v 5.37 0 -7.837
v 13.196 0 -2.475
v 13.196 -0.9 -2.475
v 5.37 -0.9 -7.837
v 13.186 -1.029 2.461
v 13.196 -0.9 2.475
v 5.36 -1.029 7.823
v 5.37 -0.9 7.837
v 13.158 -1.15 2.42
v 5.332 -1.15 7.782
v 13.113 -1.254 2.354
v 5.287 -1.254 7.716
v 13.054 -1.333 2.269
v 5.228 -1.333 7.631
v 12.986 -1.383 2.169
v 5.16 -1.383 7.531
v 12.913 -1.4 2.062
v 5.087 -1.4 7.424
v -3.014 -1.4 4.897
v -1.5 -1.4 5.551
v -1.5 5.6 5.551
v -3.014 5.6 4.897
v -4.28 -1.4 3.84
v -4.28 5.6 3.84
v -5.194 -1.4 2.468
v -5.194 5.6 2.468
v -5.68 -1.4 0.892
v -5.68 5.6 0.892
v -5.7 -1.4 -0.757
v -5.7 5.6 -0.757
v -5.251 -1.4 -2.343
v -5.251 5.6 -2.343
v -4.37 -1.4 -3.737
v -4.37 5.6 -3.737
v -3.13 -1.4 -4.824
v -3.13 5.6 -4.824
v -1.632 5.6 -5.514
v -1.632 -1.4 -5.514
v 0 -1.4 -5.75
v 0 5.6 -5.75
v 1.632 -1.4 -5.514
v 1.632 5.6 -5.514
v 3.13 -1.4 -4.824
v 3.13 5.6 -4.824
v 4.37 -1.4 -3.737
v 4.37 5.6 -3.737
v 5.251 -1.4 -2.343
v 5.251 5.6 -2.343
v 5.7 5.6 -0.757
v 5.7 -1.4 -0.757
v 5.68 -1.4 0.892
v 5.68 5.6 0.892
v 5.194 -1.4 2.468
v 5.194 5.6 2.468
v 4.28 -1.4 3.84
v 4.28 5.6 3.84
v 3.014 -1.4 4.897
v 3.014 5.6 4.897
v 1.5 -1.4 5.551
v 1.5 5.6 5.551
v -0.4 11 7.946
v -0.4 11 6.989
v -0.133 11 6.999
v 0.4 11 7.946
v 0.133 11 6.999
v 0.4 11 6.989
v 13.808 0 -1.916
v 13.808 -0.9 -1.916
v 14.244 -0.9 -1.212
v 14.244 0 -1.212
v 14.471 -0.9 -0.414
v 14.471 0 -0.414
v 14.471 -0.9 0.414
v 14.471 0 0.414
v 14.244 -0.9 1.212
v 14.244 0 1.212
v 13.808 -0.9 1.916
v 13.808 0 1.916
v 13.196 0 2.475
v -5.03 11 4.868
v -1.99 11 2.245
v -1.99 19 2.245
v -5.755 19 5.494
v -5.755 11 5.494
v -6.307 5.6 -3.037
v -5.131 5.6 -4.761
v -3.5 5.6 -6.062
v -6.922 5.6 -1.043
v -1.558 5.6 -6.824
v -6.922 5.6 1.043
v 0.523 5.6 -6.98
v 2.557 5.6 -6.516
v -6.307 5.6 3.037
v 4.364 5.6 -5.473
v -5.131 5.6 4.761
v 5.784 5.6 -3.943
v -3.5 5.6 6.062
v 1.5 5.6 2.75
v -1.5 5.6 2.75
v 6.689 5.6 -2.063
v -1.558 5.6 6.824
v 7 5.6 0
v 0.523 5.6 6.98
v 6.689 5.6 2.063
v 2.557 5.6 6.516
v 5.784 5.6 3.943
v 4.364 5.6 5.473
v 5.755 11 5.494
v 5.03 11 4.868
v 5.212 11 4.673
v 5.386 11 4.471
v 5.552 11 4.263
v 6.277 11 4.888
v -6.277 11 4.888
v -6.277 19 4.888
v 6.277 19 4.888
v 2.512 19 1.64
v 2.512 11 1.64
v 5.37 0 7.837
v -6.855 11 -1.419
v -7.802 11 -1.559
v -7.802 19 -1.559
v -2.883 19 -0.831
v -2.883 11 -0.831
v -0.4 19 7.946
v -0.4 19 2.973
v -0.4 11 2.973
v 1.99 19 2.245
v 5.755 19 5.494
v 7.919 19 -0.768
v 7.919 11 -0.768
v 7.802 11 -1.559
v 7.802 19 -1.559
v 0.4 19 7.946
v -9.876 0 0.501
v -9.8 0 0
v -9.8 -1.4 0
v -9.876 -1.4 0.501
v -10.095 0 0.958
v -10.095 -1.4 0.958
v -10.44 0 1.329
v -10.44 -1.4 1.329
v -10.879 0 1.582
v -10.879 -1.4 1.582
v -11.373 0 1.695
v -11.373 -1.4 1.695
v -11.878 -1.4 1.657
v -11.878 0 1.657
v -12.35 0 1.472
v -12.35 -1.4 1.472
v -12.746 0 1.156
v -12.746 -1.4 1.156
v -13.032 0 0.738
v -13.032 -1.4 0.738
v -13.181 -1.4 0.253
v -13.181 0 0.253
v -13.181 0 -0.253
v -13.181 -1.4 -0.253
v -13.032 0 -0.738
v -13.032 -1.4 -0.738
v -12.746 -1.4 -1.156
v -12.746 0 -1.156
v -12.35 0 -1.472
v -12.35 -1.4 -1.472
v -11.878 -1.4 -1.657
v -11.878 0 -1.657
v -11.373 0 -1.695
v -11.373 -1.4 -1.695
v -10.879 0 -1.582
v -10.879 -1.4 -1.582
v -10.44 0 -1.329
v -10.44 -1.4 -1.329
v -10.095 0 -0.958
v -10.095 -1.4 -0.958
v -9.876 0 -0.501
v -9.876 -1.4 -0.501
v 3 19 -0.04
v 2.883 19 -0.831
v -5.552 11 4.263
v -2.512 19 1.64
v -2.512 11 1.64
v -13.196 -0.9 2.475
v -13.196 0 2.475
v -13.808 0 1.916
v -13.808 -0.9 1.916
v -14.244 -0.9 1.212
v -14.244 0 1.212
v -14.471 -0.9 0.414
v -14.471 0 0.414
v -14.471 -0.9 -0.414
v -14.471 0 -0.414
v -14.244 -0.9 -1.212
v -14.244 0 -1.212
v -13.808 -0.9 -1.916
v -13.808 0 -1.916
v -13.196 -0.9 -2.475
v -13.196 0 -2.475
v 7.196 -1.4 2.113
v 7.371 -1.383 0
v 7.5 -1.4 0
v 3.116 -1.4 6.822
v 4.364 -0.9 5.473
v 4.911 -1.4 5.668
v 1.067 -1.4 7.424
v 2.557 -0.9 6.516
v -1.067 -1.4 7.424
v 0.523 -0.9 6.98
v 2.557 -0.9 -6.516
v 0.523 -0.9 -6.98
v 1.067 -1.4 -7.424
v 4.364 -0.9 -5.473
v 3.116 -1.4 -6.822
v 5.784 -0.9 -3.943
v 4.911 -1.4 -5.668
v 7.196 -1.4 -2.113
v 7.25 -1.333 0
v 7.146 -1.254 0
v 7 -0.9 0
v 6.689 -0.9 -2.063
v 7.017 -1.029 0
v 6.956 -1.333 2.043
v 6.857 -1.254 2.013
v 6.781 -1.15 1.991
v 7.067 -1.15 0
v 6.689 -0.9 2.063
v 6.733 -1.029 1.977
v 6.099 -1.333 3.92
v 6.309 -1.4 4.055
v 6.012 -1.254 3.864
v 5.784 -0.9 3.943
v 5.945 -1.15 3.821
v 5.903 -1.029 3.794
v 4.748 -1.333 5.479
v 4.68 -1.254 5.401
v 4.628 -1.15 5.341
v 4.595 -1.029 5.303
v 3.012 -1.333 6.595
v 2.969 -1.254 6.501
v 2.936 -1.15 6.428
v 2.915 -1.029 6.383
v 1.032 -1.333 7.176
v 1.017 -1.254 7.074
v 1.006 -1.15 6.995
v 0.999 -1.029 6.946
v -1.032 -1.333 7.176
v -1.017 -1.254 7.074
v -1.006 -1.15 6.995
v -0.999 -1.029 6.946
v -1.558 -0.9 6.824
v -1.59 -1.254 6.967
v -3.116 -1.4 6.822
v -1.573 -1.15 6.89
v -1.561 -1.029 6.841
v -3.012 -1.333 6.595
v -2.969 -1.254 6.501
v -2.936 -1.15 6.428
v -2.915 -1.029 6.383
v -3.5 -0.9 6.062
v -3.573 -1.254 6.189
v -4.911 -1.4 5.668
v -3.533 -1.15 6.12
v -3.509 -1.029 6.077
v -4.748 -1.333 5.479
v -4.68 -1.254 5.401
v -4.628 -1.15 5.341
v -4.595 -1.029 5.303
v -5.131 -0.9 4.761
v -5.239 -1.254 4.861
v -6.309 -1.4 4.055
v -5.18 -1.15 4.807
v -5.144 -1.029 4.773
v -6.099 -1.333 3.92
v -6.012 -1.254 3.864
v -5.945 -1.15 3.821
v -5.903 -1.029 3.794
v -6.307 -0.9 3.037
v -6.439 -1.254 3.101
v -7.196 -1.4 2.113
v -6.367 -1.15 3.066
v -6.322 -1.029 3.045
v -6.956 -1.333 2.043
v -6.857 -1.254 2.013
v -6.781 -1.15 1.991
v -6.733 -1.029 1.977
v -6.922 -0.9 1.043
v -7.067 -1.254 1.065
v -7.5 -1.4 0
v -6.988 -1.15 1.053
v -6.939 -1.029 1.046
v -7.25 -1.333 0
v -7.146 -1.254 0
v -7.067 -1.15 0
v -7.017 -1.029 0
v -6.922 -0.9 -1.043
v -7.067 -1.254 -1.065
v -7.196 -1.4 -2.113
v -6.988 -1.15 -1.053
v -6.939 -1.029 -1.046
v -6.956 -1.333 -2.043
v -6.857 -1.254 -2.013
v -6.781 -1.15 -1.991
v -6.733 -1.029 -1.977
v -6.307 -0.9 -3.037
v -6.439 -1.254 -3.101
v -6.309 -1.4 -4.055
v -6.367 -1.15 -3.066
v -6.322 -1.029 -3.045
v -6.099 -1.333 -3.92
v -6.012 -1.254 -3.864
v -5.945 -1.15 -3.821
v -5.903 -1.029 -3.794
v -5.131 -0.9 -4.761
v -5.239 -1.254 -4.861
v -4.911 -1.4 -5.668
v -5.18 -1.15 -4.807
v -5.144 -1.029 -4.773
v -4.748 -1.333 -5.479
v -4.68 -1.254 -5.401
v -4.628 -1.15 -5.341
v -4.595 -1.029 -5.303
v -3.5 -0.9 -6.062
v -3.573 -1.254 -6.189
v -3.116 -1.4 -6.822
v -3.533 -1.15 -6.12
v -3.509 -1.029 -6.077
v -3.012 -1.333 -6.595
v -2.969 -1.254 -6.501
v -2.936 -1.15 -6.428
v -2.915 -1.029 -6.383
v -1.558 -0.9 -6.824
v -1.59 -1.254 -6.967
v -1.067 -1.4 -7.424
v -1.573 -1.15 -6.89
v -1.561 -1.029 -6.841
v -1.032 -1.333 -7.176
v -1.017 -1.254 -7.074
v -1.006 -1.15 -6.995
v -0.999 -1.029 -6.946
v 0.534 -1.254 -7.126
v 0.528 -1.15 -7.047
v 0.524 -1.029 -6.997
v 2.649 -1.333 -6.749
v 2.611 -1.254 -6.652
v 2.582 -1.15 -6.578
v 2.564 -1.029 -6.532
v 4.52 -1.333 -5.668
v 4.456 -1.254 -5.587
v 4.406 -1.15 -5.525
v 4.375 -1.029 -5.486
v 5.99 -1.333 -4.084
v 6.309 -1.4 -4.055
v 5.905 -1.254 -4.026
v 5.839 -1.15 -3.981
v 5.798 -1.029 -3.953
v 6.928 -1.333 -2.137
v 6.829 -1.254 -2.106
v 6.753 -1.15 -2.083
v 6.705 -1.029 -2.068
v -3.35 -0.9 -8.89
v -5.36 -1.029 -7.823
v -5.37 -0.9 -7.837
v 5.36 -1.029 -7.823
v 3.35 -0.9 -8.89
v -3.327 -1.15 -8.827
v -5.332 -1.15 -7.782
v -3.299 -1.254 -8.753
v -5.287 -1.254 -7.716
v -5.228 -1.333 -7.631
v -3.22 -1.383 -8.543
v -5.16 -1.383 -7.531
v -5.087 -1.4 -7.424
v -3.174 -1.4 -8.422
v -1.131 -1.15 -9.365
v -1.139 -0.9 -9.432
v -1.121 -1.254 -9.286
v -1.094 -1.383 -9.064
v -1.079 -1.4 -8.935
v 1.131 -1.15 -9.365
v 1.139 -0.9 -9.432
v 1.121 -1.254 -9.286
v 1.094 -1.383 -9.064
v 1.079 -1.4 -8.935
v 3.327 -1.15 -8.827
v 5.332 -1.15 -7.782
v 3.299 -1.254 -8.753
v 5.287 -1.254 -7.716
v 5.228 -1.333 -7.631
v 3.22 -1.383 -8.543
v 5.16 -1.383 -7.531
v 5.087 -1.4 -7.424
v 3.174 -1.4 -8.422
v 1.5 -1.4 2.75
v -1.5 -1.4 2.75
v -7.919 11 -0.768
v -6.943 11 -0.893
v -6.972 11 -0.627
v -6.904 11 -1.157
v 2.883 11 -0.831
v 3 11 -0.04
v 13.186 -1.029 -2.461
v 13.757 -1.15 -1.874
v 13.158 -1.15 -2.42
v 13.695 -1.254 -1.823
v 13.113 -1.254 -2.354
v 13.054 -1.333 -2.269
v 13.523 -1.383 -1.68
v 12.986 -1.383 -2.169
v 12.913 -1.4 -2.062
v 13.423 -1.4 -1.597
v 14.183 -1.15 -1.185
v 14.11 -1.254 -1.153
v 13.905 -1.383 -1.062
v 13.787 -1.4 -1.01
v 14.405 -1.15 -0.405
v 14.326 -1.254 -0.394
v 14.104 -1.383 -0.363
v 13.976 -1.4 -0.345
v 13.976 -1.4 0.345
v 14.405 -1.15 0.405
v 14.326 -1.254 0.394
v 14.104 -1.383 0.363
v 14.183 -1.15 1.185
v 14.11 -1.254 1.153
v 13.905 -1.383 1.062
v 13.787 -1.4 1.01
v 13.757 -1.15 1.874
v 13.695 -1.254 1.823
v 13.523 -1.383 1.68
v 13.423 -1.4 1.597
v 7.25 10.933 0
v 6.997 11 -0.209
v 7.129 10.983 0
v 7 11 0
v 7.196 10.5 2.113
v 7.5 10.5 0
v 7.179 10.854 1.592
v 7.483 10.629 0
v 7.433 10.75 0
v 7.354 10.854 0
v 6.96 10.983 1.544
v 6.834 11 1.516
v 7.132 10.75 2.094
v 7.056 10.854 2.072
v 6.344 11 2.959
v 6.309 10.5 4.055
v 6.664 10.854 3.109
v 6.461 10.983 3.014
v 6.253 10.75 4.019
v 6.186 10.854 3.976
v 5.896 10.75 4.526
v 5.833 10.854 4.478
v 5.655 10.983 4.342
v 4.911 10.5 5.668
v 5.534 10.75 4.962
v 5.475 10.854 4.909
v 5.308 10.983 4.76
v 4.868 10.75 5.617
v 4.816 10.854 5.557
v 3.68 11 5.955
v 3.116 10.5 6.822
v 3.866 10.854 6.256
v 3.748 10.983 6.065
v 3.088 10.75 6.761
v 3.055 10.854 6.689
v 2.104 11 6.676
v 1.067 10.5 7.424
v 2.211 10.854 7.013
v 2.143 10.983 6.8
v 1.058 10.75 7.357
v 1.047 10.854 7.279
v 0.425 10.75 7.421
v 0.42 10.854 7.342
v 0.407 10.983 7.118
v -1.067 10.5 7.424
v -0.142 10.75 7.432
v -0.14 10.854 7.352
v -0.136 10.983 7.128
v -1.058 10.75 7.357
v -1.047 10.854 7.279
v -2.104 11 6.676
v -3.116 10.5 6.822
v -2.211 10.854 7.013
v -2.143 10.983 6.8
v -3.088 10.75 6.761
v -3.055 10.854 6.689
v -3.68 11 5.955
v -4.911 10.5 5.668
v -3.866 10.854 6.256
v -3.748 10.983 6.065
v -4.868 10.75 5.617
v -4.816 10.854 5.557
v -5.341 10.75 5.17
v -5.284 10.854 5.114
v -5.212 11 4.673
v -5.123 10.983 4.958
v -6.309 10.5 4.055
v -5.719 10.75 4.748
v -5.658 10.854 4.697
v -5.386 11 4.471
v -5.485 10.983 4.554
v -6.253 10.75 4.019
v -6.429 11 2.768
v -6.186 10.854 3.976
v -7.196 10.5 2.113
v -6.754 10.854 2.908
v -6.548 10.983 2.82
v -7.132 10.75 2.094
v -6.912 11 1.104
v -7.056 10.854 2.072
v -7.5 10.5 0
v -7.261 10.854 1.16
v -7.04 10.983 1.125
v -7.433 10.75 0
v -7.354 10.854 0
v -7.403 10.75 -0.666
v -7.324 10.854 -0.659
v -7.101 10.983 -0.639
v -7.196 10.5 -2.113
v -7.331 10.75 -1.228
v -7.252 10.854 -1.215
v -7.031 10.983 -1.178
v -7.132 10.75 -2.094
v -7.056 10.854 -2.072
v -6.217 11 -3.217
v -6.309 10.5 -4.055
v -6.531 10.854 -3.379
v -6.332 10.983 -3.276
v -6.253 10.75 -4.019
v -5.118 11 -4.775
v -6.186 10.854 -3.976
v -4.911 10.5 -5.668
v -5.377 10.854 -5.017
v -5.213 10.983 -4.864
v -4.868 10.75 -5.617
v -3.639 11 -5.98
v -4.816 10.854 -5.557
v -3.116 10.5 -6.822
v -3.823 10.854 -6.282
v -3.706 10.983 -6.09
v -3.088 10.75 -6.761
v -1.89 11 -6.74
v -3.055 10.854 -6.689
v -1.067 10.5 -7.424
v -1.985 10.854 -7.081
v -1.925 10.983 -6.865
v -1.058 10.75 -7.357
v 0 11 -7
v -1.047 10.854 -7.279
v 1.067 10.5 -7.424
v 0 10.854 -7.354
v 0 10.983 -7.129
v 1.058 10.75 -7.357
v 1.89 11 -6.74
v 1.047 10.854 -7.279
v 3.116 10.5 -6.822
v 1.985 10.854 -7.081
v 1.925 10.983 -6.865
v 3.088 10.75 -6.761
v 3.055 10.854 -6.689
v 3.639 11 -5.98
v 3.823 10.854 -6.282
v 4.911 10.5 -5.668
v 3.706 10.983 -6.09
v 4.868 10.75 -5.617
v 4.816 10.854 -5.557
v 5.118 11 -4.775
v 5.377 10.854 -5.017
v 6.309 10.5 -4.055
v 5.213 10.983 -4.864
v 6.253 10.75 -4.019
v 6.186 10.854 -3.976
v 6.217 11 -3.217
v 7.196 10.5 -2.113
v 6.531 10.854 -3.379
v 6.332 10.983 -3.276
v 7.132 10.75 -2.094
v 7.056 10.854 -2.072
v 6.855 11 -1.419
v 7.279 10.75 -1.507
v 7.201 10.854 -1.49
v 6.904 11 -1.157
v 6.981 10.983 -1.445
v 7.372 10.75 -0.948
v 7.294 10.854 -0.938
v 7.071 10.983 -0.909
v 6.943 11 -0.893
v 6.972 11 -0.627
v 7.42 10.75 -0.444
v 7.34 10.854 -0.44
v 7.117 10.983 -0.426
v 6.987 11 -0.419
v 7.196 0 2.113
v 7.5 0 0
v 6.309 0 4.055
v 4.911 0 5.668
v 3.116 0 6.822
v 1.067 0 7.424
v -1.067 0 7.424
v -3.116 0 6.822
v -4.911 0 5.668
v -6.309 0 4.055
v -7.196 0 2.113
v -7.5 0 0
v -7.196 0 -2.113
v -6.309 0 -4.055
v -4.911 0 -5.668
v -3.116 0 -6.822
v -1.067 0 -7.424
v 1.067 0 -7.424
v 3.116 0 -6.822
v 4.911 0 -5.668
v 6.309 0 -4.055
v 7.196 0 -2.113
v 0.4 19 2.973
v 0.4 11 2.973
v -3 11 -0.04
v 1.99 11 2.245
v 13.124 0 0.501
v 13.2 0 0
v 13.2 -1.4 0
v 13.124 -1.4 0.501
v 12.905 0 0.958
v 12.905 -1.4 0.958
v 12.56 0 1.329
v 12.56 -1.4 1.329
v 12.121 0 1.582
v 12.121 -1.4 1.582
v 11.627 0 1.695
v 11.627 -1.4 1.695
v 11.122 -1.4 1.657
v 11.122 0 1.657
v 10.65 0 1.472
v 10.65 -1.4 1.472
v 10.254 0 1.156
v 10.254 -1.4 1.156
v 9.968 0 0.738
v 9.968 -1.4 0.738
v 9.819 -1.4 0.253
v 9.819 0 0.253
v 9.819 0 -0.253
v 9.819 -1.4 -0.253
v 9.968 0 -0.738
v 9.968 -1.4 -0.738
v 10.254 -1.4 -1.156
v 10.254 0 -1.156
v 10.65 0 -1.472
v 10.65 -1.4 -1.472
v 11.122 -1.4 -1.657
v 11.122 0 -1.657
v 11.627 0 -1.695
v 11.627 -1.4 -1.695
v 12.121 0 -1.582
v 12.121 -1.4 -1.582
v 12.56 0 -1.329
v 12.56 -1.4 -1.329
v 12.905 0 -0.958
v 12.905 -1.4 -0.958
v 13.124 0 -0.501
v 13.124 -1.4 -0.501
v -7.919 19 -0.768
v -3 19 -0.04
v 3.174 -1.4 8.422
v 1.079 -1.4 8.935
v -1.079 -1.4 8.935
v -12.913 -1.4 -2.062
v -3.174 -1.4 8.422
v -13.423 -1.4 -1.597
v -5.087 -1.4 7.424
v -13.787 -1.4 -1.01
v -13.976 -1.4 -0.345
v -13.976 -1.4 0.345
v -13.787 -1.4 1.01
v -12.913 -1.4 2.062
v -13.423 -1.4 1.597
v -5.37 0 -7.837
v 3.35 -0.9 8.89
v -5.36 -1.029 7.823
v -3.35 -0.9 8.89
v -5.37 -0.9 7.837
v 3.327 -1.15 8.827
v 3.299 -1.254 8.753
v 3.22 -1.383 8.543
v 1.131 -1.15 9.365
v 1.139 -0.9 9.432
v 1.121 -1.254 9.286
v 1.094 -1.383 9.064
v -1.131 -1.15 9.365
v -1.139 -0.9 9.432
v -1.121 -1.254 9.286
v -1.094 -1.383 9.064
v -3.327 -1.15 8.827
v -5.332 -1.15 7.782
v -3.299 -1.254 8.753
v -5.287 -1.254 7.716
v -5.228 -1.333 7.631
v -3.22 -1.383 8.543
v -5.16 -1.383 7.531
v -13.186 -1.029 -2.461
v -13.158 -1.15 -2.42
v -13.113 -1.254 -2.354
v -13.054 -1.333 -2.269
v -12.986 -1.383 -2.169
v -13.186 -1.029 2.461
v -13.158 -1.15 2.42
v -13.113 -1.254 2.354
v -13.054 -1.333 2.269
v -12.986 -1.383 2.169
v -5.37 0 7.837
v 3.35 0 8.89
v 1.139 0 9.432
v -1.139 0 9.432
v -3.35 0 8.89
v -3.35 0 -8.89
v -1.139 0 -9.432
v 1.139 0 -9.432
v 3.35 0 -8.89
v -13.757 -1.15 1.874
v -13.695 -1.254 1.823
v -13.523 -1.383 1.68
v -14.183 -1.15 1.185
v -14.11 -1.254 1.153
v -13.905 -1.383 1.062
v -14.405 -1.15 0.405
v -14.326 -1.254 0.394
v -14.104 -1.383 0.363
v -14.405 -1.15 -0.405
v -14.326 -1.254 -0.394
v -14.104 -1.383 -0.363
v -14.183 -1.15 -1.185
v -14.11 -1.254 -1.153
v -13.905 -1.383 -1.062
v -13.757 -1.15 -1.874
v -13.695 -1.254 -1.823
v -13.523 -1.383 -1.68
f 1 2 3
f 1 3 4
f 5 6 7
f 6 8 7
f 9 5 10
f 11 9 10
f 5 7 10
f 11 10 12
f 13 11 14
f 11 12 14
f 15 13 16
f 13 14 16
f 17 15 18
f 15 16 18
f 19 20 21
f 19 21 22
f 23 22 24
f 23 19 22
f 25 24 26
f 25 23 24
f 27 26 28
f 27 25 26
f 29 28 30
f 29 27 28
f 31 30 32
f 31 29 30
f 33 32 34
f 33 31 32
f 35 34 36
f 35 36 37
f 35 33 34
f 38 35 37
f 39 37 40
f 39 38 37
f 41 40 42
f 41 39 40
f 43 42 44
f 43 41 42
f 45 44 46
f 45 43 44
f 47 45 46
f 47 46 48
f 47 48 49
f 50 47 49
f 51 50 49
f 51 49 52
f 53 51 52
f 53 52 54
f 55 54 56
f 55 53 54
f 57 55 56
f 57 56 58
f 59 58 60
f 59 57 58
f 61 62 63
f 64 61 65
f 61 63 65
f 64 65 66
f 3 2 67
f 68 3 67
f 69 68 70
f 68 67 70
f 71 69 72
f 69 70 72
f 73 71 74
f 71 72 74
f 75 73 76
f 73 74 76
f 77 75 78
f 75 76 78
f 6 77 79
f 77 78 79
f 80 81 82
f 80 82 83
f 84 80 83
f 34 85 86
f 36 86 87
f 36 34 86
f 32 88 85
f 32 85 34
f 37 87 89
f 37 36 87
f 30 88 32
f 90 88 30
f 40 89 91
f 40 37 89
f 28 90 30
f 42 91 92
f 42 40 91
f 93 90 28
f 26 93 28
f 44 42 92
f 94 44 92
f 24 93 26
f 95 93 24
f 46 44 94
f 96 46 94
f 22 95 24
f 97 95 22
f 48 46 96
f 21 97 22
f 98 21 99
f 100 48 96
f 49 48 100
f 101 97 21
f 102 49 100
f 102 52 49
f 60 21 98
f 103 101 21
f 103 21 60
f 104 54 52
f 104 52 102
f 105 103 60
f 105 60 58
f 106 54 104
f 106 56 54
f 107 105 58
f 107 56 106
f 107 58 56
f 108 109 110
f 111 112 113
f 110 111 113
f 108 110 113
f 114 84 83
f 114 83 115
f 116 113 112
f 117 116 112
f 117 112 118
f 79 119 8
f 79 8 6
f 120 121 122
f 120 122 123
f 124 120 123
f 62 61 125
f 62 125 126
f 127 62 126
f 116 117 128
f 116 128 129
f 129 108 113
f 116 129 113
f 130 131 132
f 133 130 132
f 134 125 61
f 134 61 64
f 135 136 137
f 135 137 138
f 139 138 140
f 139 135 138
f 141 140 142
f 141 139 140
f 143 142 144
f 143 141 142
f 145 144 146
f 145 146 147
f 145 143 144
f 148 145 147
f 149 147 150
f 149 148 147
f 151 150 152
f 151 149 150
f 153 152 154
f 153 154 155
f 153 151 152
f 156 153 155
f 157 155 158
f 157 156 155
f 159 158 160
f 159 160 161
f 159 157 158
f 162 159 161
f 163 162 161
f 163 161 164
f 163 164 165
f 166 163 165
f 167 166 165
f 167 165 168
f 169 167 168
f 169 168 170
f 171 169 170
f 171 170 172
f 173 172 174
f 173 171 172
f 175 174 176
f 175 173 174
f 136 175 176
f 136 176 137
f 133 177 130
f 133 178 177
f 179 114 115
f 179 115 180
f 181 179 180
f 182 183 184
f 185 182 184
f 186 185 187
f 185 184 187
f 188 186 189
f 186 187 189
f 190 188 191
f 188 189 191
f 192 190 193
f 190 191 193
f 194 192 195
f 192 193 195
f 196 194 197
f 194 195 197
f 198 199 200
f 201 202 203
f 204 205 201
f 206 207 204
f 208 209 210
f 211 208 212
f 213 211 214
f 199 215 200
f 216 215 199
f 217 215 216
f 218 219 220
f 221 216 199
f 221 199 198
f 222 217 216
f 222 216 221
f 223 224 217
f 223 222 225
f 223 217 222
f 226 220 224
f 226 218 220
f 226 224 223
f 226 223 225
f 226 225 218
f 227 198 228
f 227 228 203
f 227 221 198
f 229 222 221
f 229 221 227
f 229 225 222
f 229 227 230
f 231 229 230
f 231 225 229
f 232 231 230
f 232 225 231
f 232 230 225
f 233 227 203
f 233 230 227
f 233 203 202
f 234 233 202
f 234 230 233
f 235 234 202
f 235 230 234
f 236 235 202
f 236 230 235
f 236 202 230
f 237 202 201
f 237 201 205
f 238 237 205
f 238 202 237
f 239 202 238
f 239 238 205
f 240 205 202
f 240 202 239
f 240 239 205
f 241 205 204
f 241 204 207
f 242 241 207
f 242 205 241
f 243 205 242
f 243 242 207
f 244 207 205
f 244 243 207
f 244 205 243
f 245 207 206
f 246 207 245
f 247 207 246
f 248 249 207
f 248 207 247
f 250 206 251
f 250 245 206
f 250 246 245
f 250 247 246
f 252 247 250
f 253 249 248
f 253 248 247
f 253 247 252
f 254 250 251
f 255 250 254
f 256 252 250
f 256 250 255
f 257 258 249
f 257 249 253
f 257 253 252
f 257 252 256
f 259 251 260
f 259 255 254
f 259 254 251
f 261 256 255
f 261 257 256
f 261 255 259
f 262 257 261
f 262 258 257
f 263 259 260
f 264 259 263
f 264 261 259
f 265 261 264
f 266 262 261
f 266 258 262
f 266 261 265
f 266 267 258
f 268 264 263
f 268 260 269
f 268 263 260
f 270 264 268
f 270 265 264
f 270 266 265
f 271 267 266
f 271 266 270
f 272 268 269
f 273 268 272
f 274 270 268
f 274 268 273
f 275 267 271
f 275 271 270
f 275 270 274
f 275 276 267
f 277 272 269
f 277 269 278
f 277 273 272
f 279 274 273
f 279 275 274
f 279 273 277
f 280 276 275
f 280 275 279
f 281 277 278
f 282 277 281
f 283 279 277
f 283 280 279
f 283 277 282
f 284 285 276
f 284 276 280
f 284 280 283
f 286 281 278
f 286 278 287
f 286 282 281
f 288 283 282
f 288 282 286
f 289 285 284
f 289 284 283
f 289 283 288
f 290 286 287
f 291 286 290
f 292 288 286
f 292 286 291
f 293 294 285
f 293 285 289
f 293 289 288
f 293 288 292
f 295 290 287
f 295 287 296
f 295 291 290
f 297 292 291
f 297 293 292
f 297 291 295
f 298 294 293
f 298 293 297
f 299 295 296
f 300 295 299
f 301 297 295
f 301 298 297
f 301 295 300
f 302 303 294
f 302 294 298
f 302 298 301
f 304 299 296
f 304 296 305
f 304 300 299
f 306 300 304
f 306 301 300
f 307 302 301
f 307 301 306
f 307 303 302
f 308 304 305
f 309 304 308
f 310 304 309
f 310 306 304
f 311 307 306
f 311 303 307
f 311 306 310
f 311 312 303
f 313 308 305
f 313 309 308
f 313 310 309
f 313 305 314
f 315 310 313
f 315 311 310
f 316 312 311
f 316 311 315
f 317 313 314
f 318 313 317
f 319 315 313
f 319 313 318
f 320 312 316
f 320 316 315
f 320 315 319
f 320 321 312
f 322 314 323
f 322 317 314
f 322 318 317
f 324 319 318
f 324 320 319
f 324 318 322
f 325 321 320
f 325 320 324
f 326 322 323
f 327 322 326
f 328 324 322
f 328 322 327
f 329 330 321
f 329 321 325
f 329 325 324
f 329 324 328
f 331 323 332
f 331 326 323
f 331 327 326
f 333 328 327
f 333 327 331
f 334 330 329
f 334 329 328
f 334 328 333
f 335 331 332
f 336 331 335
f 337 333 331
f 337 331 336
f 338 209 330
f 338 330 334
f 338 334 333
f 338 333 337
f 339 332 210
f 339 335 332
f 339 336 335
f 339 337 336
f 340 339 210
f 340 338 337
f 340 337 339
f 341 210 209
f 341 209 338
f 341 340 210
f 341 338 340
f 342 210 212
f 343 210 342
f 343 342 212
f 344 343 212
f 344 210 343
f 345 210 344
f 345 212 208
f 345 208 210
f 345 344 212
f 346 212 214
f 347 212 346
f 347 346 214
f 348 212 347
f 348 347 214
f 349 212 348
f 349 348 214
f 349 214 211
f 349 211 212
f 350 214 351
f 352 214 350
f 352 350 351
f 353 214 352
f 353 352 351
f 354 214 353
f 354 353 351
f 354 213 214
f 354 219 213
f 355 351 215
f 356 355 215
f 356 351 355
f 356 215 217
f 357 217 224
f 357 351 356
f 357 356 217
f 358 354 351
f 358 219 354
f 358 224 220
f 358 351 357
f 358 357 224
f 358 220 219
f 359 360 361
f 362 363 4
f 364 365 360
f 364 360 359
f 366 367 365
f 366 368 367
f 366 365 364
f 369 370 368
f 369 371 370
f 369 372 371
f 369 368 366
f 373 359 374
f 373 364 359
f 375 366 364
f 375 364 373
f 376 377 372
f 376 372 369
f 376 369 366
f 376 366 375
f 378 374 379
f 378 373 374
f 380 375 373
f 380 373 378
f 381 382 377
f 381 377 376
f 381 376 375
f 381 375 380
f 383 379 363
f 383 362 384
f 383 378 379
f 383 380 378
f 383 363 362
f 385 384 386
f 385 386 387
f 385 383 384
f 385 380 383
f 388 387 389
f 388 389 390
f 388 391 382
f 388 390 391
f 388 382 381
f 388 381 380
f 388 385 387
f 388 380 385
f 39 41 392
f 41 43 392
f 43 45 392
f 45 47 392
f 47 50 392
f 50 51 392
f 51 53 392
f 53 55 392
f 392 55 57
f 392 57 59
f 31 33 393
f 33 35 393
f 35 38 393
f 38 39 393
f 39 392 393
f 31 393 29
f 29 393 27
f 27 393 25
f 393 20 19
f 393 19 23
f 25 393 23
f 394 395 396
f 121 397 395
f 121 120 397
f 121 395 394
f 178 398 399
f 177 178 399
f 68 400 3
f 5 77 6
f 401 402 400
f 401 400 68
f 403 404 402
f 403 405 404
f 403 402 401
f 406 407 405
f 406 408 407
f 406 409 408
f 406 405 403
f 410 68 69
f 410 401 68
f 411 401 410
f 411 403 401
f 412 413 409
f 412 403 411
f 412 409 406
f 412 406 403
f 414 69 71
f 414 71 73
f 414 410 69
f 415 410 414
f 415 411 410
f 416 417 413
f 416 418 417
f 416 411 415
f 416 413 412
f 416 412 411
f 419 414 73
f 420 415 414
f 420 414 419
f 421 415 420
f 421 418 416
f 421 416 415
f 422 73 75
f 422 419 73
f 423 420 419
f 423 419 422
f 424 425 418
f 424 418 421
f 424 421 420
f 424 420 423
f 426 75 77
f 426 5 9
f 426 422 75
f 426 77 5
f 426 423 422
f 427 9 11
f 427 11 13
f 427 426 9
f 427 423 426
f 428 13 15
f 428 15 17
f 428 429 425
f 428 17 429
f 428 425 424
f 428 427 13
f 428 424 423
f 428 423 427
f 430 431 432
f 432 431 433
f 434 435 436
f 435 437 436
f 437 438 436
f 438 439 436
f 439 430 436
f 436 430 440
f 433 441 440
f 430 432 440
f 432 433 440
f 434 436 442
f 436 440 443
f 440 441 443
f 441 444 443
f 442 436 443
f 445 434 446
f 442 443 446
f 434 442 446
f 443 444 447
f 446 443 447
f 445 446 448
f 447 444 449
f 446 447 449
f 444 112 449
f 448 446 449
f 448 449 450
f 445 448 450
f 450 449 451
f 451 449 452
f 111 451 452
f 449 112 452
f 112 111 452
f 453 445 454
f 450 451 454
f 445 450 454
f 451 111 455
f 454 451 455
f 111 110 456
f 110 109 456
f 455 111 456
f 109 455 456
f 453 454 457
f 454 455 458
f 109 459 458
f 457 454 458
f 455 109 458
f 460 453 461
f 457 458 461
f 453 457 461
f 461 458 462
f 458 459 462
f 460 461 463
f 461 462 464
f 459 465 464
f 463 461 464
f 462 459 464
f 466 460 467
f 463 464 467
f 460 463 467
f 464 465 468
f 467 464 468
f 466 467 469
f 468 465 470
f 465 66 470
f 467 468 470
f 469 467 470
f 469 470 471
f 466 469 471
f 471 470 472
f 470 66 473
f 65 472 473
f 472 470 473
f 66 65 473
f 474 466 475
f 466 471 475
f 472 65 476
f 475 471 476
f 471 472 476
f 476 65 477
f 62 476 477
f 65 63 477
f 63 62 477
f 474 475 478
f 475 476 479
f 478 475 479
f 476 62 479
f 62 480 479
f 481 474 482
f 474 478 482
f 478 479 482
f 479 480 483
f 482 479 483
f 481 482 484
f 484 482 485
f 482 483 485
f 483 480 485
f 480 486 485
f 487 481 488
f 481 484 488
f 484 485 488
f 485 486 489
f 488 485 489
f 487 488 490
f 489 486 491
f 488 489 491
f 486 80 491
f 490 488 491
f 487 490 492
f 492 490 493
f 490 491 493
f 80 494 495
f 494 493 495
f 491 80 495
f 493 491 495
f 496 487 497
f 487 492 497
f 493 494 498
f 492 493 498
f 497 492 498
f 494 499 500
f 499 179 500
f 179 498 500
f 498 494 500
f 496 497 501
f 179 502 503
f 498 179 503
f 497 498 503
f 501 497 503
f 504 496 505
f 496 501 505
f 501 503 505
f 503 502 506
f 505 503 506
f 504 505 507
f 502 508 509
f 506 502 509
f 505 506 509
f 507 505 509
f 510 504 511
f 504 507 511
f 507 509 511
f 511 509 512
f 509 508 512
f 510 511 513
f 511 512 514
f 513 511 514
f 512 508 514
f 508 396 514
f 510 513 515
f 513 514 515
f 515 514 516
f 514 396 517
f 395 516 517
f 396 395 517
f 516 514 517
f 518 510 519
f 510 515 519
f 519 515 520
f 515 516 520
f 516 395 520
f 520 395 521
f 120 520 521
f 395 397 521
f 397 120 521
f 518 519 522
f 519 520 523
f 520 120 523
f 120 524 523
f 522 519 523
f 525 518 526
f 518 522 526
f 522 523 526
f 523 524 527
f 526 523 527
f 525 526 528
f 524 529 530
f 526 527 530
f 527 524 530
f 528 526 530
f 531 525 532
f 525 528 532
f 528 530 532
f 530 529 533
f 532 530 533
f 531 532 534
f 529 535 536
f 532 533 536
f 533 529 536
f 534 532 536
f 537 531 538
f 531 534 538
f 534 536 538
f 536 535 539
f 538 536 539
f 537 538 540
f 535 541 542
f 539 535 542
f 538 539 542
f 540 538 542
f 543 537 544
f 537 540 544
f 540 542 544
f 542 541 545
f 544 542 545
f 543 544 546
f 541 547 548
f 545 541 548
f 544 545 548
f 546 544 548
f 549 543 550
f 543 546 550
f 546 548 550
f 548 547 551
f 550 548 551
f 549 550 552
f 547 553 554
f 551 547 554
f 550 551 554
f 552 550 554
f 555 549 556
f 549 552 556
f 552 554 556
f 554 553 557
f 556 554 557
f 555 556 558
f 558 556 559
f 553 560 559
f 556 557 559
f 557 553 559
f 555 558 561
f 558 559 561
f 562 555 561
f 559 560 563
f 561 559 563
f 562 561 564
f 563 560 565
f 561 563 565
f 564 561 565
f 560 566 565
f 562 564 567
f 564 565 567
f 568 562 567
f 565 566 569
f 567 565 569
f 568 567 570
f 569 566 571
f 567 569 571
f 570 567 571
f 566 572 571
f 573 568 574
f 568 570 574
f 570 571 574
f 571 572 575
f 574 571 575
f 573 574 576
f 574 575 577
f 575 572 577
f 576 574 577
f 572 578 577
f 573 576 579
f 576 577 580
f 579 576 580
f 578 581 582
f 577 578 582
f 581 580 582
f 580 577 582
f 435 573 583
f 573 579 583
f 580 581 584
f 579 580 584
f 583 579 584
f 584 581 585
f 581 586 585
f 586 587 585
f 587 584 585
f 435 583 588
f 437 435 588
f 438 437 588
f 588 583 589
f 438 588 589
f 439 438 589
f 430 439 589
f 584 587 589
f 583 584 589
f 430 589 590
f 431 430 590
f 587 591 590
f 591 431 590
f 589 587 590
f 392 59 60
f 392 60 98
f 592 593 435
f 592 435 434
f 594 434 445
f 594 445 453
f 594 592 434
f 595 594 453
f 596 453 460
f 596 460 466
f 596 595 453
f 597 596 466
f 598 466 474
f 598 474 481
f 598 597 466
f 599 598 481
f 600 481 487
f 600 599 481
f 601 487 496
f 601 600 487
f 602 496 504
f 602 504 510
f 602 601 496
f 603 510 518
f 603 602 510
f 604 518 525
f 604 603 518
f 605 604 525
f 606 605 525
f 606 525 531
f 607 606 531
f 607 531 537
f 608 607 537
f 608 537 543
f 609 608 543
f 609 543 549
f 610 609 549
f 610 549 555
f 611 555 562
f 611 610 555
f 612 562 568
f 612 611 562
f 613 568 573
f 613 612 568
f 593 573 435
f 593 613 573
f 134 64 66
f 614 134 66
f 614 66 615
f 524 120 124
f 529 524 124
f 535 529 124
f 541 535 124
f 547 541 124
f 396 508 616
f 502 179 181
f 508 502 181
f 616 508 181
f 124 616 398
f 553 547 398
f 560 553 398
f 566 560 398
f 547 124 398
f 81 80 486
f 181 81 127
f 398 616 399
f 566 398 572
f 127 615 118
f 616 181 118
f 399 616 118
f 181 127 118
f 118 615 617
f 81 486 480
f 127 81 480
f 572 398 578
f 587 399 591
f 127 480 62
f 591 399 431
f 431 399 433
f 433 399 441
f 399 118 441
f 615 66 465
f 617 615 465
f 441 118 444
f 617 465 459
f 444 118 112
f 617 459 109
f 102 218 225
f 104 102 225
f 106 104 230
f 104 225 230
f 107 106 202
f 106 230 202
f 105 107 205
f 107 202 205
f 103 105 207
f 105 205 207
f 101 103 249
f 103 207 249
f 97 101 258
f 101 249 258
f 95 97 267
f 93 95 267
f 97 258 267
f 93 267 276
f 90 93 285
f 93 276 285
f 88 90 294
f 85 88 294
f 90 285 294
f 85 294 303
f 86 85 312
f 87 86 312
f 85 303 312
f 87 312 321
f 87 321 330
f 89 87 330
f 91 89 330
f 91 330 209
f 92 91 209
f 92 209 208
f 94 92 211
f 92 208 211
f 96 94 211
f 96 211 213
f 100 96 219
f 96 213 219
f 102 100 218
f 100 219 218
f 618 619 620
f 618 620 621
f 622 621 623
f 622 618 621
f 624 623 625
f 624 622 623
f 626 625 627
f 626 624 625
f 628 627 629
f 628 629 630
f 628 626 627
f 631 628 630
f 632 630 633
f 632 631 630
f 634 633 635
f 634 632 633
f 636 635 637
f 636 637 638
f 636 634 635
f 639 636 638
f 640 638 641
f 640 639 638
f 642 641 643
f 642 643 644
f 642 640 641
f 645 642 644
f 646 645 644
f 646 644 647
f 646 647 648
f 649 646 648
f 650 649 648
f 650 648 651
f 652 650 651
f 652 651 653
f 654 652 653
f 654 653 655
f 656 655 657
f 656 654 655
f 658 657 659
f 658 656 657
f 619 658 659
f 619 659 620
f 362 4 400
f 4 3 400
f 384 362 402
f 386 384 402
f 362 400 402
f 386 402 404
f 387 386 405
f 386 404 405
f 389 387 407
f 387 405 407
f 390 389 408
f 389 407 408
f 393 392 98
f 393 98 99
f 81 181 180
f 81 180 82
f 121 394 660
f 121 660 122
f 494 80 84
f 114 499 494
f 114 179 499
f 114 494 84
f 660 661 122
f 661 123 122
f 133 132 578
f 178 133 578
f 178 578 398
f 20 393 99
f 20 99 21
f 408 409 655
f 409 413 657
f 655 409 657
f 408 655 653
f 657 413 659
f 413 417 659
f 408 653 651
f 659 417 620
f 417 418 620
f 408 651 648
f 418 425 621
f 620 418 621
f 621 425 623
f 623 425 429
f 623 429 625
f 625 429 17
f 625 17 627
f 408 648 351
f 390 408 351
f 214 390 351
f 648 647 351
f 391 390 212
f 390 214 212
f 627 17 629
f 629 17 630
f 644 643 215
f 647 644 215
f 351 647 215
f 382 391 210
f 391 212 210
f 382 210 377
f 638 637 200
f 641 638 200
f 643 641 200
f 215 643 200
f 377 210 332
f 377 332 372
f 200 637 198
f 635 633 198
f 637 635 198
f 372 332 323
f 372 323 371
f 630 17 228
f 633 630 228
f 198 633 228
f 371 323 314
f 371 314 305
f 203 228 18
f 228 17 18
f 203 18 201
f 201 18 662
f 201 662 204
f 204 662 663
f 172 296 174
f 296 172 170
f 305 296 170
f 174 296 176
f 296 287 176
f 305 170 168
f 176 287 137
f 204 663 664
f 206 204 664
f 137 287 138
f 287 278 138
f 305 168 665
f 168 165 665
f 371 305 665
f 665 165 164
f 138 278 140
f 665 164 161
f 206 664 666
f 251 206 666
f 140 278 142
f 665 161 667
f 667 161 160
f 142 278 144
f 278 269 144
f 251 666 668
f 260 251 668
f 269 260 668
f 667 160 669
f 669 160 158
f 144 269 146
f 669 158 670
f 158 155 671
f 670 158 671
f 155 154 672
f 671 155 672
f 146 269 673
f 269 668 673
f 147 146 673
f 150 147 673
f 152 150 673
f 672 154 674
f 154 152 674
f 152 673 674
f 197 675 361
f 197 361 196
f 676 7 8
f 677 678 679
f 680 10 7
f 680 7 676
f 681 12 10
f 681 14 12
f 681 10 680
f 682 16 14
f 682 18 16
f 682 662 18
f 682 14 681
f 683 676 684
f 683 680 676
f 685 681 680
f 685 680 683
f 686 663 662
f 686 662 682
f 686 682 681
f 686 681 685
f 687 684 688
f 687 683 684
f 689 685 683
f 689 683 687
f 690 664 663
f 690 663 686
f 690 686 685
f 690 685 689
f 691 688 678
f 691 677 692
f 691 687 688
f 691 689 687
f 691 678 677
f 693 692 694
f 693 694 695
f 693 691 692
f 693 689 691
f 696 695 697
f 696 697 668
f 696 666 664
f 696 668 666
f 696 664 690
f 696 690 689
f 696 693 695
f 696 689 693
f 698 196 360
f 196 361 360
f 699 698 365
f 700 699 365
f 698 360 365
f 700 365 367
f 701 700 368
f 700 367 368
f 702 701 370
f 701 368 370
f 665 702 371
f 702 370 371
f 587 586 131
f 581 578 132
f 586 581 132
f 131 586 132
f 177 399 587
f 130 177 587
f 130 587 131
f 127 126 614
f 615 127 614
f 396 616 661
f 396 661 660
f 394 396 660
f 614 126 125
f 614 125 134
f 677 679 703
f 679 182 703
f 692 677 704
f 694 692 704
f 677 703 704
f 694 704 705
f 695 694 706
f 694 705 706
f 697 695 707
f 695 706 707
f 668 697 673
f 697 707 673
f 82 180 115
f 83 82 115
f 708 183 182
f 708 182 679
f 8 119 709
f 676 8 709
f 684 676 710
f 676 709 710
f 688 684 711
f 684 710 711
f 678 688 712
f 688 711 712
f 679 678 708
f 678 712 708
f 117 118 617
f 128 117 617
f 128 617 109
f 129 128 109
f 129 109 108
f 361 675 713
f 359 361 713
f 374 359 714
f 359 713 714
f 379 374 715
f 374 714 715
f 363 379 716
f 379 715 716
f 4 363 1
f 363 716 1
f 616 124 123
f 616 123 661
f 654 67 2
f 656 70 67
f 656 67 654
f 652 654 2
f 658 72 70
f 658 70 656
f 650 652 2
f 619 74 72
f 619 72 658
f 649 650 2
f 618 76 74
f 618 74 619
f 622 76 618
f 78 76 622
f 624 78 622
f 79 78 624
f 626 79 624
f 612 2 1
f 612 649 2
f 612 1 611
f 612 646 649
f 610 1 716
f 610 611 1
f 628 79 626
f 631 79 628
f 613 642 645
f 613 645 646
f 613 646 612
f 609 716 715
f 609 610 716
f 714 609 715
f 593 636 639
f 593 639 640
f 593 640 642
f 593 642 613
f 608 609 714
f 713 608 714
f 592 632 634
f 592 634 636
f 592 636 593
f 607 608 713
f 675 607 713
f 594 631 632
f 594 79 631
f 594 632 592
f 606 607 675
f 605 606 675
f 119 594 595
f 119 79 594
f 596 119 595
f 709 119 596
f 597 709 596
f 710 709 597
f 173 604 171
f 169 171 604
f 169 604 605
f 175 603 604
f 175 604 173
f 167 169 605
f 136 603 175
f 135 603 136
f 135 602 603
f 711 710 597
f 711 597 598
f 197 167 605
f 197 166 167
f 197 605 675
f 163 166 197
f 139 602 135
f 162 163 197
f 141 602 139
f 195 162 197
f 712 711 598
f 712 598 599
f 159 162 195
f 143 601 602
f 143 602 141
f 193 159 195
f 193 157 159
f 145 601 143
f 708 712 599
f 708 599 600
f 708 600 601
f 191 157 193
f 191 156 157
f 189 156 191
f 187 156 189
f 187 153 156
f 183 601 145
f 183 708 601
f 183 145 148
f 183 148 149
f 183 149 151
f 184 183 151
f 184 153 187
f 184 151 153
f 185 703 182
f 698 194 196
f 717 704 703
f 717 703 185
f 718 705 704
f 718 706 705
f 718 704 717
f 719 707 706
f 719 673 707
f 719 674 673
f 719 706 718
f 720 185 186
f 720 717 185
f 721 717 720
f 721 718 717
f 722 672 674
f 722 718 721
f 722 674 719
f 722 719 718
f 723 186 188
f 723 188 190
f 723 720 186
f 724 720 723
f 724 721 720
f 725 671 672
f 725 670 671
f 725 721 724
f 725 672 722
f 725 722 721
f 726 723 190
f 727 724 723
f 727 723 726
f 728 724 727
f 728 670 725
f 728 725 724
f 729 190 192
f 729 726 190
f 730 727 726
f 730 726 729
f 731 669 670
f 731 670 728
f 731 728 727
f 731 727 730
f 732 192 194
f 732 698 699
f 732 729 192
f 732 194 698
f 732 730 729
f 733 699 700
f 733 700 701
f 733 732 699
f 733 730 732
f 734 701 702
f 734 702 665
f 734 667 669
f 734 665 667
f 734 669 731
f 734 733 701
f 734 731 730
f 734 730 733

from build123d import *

# Parameters (mm, degrees)
SKETCH_R     = 1.7
PAD_DEPTH    = 1.4
SKETCH001_R  = 7.5
PAD001_DEPTH = 11
SKETCH002_R  = 7
POCKET_DEPTH = 7
FILLET_R     = 0.5
SKETCH004_W  = 0.8
SKETCH004_H  = 4.972782
PAD002_DEPTH = 8


with BuildPart() as part:
    # Sketch → Pad (new body)
    with BuildSketch(Plane.XZ):
        with BuildLine():
            Line((5.369565, 7.836949), (13.195652, 2.474826))
            ThreePointArc((13.195652, -2.474826), (14.5, 0), (13.195652, 2.474826))
            Line((13.195652, -2.474826), (5.369565, -7.836949))
            ThreePointArc((-5.369565, -7.836949), (0, -9.5), (5.369565, -7.836949))
            Line((-5.369565, -7.836949), (-13.195652, -2.474826))
            ThreePointArc((-13.195652, 2.474826), (-14.5, 0), (-13.195652, -2.474826))
            Line((-13.195652, 2.474826), (-5.369565, 7.836949))
            ThreePointArc((5.369565, 7.836949), (0, 9.5), (-5.369565, 7.836949))
        make_face()
        with Locations((11.5, 0)):
            Circle(SKETCH_R, mode=Mode.SUBTRACT)
        with Locations((-11.5, 0)):
            Circle(SKETCH_R, mode=Mode.SUBTRACT)
    extrude(amount=PAD_DEPTH)

    # Sketch001 → Pad001 (join)
    with BuildSketch(Plane.XZ):
        Circle(SKETCH001_R)
    extrude(amount=-PAD001_DEPTH)

    # Sketch002 (on Face5 of Pad001) → Pocket (cut)
    with BuildSketch(Plane.XZ.offset(1.4)):
        Circle(SKETCH002_R)
        with BuildLine():
            ThreePointArc((-1.5, 5.550901), (0, -5.75), (1.5, 5.550901))
            Line((1.5, 5.550901), (1.5, 2.75))
            Line((1.5, 2.75), (-1.5, 2.75))
            Line((-1.5, 2.75), (-1.5, 5.550901))
        make_face(mode=Mode.SUBTRACT)
    extrude(amount=-POCKET_DEPTH, mode=Mode.SUBTRACT)

    # Fillet
    fillet_edges = [part.edges().sort_by_distance(p)[0] for p in [
        (0, -1.4, 9.5),
        (-9.282609, -1.4, 5.155887),
        (-14.5, -1.4, 0),
        (-9.282609, -1.4, -5.155887),
        (0, -1.4, -9.5),
        (9.282609, -1.4, -5.155887),
        (14.5, -1.4, 0),
        (9.282609, -1.4, 5.155887),
        (-7.5, 11, 0),
        (-7, -1.4, 0),
    ]]
    fillet(fillet_edges, radius=FILLET_R)

    # Sketch004 (on Face25 of Fillet) → Pad002 (join)
    with BuildSketch(Plane(origin=(0, 11, 0), x_dir=(1, 0, 0), z_dir=(0, 1, 0))):
        Polygon((2.999739, 0.039573), (7.918946, 0.767563), (7.80183, 1.558944), (2.882623, 0.830954), align=None)
        Polygon((2.512335, -1.639565), (1.989694, -2.245244), (5.754578, -5.493969), (6.277219, -4.88829), align=None)
        with Locations((0, -5.459605)):
            Rectangle(SKETCH004_W, SKETCH004_H)
        Polygon((-5.754578, -5.493969), (-6.277219, -4.88829), (-2.512335, -1.639565), (-1.989694, -2.245244), align=None)
        Polygon((-2.999739, 0.039573), (-7.918946, 0.767563), (-7.80183, 1.558944), (-2.882623, 0.830954), align=None)
    extrude(amount=PAD002_DEPTH)


solid = part.part
